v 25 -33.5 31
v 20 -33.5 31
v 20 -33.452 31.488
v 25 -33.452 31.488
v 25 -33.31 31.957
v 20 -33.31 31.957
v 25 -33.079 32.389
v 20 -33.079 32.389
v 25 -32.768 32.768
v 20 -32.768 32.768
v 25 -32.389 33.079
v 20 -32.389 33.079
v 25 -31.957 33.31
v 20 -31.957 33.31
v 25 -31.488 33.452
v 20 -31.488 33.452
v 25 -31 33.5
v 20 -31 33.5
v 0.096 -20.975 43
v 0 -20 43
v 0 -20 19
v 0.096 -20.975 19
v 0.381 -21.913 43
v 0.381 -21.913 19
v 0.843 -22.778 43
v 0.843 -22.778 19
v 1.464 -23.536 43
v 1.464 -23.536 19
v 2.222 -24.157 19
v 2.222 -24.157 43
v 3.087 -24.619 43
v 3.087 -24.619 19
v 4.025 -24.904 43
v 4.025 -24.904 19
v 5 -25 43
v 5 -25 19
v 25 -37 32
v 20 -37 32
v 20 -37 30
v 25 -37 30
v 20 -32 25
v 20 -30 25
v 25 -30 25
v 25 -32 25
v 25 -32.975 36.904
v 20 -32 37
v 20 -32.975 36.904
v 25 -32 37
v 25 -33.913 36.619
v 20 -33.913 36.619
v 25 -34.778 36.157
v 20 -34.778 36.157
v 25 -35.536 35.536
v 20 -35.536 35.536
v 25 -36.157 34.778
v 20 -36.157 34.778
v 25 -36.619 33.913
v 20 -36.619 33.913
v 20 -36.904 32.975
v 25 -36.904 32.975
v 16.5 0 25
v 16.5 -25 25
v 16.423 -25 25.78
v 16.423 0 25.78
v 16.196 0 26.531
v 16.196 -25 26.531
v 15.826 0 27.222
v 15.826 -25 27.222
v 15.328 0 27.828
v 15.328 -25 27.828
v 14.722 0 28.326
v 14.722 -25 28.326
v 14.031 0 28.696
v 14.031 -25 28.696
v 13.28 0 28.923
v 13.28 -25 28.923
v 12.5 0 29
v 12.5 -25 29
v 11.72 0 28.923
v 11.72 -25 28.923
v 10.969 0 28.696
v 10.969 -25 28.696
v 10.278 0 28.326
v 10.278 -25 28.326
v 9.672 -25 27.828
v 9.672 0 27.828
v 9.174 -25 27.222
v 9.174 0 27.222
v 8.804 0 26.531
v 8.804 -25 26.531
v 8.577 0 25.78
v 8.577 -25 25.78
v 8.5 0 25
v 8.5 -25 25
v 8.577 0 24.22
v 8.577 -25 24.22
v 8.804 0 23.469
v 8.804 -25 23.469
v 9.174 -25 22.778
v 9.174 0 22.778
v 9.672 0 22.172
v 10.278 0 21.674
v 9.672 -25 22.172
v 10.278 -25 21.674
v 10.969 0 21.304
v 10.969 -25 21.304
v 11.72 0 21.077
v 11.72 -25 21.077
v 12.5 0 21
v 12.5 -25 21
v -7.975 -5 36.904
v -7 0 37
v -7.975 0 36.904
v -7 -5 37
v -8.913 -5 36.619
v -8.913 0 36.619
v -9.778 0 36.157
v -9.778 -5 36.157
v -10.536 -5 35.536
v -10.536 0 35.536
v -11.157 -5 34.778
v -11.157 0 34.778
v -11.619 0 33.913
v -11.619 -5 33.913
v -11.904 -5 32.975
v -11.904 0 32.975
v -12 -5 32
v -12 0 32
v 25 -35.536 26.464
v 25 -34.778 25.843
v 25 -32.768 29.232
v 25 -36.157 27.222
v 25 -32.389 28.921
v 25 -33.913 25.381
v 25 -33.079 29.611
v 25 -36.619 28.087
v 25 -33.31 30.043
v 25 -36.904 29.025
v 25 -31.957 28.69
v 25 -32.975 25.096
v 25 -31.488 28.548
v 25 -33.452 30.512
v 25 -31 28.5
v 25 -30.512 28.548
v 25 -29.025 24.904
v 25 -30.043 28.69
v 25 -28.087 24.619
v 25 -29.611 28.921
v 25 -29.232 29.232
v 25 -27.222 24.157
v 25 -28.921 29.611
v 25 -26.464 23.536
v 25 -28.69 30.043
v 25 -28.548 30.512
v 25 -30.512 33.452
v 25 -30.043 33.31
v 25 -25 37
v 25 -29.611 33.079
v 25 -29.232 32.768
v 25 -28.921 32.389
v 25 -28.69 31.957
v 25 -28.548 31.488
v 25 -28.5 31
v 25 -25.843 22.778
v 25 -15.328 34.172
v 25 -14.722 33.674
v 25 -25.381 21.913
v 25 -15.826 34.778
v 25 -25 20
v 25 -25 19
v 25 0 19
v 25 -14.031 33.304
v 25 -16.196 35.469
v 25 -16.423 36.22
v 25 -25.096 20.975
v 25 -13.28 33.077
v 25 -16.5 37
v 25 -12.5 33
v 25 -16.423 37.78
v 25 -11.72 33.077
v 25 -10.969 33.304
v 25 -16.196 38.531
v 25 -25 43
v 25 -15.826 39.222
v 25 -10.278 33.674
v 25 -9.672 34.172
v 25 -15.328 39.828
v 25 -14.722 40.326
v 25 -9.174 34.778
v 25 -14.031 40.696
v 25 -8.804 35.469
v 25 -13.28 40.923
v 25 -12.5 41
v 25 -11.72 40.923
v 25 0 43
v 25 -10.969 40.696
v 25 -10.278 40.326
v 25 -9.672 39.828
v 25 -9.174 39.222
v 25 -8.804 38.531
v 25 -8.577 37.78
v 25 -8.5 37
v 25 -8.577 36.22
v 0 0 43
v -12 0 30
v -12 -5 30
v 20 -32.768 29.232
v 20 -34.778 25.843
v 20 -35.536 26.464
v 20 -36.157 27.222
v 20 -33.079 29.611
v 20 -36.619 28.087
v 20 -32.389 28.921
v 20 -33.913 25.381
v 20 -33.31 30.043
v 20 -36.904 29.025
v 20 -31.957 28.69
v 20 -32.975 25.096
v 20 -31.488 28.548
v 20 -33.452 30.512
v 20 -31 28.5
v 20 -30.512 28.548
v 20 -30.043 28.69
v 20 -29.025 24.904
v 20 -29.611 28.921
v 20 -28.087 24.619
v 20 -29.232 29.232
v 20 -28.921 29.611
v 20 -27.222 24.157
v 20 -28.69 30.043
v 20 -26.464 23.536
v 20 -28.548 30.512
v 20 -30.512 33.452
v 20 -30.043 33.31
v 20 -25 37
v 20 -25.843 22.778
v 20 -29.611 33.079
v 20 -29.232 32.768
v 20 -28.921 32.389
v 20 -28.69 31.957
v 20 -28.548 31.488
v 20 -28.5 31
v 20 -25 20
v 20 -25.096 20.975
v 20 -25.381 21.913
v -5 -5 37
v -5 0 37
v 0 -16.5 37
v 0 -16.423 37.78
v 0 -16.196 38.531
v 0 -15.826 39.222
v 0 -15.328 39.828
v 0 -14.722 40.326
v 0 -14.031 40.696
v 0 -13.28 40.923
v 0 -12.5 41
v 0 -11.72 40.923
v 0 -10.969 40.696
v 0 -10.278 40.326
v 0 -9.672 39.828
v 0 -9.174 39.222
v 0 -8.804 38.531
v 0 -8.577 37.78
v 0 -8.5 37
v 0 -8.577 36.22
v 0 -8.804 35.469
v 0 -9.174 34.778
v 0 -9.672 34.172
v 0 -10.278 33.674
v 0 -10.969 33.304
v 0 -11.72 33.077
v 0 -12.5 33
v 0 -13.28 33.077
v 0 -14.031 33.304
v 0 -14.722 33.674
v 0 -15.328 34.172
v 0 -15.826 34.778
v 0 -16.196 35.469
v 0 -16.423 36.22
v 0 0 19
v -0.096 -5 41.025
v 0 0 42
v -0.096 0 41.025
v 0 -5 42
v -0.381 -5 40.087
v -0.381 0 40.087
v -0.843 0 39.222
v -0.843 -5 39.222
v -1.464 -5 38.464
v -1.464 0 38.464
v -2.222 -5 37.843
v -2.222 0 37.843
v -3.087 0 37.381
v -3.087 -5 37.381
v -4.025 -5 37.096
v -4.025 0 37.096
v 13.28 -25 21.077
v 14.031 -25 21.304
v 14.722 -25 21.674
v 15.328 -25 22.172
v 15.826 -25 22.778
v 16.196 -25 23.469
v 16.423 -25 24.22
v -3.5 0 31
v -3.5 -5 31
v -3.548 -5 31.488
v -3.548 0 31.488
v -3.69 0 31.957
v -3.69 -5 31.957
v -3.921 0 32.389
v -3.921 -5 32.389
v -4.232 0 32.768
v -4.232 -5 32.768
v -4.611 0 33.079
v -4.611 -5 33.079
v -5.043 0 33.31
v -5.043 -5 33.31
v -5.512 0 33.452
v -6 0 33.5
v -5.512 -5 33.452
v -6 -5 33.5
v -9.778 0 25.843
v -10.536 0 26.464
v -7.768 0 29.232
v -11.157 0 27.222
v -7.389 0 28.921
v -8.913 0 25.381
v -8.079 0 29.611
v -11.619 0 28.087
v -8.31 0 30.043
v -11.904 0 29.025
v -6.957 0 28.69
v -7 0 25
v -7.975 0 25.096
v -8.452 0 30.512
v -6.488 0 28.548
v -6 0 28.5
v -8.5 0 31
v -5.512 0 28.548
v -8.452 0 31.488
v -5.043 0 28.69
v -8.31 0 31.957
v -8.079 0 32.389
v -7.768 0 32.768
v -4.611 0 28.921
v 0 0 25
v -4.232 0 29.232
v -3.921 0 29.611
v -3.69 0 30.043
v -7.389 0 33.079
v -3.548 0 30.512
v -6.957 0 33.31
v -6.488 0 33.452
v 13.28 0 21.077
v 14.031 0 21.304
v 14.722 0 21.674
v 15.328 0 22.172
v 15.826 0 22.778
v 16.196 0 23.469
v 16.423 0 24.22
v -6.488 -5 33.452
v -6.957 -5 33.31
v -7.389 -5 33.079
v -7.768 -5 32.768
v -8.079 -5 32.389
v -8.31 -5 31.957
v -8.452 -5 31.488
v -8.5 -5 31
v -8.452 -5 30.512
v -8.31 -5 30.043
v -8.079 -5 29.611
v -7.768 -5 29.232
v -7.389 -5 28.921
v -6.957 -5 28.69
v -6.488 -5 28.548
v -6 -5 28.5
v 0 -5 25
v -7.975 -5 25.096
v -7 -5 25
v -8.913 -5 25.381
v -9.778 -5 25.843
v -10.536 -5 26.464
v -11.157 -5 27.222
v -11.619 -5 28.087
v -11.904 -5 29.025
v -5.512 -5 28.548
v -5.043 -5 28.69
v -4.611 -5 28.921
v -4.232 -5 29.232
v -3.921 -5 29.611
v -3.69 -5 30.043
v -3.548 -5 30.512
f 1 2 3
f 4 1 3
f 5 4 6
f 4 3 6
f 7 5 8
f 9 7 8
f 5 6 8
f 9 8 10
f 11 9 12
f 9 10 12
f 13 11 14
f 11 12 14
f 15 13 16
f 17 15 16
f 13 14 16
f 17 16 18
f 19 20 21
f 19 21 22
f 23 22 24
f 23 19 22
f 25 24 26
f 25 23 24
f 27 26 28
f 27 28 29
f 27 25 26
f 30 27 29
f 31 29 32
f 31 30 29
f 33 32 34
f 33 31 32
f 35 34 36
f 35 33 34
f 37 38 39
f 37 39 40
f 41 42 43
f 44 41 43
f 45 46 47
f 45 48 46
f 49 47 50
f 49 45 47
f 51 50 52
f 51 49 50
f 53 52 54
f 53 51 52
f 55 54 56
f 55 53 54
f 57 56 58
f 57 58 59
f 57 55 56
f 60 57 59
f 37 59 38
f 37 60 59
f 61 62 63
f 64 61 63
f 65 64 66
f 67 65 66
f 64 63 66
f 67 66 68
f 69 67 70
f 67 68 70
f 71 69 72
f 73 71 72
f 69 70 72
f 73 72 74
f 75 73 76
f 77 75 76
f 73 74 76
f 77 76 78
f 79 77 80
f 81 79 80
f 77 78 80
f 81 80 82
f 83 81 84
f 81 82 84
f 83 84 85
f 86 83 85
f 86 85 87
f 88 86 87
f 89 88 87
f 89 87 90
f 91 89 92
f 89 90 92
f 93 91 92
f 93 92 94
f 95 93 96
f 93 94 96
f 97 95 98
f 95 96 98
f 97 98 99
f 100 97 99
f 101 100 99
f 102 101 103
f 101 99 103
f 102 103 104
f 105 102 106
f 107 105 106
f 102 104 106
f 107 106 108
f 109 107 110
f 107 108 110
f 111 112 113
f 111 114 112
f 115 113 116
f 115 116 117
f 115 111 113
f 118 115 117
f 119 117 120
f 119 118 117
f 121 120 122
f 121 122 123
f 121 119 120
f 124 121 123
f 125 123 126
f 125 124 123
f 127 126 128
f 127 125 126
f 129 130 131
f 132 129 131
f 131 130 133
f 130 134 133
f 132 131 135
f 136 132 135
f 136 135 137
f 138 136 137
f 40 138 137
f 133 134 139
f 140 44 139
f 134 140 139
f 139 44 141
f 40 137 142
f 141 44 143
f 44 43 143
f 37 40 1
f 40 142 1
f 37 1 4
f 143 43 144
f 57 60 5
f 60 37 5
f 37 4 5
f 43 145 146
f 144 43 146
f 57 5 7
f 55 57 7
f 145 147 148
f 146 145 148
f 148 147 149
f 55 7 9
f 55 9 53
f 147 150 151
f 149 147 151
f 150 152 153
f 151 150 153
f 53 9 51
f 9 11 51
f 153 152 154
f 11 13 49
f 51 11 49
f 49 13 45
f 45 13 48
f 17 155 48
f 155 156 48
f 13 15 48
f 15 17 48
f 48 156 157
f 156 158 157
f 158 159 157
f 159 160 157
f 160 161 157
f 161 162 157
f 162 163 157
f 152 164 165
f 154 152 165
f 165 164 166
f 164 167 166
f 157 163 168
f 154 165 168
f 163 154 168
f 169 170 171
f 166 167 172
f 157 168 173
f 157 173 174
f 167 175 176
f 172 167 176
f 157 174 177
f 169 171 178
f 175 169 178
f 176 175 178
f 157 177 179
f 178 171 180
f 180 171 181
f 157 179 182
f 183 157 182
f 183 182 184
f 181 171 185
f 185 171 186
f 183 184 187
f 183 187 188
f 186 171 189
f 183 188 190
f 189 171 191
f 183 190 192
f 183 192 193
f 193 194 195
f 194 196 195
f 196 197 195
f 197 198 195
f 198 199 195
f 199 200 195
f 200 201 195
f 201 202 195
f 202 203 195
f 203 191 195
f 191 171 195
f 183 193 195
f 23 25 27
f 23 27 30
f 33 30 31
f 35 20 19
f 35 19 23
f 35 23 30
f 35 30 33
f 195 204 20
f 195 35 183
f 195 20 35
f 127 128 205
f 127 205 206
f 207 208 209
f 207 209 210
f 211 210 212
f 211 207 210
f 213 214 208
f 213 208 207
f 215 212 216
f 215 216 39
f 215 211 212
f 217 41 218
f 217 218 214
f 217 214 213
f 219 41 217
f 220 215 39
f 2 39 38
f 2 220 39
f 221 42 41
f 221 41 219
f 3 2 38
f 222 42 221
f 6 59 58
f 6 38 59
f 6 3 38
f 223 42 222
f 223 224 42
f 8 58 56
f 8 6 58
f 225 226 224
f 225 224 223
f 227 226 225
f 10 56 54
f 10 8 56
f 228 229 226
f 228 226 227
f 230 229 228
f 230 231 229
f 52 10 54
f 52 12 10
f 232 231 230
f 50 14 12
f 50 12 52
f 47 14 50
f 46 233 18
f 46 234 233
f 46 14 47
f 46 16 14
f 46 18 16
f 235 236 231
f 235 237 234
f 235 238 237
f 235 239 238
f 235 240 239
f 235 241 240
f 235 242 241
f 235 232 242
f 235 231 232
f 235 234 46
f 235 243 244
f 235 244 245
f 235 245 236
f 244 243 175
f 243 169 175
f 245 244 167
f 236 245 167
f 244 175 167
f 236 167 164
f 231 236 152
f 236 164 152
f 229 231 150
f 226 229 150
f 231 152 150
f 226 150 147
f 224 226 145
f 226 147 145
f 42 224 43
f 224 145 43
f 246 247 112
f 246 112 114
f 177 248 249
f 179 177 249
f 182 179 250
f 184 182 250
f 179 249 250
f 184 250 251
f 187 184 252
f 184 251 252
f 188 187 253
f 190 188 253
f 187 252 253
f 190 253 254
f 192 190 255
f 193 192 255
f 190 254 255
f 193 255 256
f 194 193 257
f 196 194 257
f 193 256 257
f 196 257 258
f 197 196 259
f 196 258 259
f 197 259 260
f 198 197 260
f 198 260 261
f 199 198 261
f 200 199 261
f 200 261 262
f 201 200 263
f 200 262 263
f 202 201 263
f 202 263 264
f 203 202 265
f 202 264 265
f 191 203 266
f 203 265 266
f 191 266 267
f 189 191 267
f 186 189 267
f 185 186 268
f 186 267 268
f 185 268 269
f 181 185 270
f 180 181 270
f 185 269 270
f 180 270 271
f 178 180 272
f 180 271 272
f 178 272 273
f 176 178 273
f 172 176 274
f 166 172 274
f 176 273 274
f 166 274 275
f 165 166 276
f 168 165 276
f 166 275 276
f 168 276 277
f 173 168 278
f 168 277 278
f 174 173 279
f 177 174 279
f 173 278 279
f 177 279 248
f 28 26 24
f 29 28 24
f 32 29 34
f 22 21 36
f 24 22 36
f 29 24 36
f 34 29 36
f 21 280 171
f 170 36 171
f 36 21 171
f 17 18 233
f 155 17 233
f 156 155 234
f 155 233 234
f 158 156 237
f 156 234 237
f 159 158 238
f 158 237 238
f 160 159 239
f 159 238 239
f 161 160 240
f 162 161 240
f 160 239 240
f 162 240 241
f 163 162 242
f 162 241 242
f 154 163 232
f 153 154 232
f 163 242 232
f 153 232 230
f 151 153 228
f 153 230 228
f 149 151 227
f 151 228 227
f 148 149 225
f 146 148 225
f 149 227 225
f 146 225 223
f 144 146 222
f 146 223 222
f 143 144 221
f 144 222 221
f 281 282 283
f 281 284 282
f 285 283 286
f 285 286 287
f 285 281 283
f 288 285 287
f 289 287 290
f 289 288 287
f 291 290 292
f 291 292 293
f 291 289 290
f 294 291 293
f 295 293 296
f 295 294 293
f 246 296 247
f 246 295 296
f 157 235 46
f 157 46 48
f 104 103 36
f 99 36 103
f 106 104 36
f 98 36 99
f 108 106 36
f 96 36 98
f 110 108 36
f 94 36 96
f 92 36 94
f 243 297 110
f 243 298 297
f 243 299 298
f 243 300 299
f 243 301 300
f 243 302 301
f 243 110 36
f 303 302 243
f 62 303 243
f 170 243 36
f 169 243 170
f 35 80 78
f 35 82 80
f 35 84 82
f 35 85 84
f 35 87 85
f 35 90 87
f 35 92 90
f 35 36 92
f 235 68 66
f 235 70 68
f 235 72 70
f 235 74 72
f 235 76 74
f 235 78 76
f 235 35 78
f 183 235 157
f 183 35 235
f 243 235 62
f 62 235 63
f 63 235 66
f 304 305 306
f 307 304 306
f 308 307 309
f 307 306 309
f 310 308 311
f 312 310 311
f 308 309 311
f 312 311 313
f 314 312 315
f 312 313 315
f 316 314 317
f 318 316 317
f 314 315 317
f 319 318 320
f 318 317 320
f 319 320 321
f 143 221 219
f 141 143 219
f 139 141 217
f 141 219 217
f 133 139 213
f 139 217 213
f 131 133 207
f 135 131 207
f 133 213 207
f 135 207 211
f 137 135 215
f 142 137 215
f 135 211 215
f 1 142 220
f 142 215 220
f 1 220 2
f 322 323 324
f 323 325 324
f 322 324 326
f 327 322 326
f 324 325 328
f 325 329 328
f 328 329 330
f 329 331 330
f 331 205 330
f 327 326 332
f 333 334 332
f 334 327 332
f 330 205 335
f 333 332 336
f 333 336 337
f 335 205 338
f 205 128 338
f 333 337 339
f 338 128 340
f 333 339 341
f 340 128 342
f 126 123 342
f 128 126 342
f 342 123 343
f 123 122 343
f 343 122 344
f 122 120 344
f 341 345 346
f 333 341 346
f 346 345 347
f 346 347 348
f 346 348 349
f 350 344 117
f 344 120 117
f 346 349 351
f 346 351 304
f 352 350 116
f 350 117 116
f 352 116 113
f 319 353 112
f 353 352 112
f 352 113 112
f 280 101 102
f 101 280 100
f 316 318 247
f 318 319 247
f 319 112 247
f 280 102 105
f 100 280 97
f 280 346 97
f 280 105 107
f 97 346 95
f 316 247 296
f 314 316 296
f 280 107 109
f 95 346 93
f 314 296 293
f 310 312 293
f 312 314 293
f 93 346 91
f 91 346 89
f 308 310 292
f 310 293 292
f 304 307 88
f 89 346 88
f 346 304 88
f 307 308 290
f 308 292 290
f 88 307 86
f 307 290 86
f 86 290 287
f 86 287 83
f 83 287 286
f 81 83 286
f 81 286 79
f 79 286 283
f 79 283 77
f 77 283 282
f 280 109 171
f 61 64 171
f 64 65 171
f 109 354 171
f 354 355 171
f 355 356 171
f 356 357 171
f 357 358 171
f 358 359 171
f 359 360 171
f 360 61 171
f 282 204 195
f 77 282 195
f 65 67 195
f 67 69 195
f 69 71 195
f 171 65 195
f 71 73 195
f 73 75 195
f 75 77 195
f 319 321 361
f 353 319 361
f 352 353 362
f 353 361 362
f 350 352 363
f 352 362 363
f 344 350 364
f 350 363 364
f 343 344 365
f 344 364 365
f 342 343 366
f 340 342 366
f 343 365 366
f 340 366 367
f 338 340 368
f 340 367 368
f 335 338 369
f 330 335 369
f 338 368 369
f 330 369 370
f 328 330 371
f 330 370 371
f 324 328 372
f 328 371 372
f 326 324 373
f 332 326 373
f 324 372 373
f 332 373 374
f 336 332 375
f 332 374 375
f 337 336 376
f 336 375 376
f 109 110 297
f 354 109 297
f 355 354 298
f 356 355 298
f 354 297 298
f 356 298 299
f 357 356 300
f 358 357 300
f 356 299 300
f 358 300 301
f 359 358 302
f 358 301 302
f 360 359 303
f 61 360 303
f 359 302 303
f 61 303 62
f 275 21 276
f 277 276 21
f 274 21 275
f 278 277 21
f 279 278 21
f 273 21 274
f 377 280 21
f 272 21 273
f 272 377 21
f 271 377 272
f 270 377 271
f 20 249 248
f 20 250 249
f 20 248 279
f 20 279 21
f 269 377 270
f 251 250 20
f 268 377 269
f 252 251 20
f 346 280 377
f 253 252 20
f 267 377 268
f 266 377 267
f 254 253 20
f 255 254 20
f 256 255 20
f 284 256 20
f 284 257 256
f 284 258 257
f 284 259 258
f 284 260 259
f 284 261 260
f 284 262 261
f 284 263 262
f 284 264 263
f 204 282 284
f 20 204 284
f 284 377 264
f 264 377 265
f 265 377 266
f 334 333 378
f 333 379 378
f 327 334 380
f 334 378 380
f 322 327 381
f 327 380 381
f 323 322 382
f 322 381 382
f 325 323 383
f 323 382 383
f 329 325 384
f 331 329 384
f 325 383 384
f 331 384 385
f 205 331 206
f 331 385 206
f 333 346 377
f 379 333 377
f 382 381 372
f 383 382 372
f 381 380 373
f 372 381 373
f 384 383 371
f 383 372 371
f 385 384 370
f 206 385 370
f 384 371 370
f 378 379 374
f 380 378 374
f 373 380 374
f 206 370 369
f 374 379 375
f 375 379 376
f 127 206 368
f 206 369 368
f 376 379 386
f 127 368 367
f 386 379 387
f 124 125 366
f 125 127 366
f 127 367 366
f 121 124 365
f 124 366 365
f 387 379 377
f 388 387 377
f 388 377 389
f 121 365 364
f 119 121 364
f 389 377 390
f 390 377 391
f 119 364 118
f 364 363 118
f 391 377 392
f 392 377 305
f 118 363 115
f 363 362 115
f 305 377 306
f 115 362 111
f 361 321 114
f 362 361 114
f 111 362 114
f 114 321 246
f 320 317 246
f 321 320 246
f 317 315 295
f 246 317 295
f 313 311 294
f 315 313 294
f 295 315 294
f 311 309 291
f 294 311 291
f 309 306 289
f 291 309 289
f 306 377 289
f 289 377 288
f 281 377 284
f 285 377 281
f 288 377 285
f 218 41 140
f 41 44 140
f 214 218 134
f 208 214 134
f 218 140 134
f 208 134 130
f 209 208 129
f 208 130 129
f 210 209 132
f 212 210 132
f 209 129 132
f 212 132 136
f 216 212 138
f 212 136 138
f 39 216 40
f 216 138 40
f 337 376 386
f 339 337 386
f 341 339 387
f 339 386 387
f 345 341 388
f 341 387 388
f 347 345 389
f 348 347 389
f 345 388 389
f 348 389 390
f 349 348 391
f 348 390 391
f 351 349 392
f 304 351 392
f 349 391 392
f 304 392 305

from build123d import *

# Parameters (mm, degrees)
F0_W      = 25
F0_H      = 45
F1_DEPTH  = 25
F3_DEPTH  = 25
F5_DEPTH  = 25
F6_W      = 5
F6_H      = 12
F7_DEPTH  = 12
F9_DEPTH  = 25
F10_R     = 5
F11_W     = 5
F11_H     = 12
F12_DEPTH = 12
F14_DEPTH = 25
F15_R     = 5
F16_W     = 19
F16_H     = 6
F17_DEPTH = 19
F19_DEPTH = 12
F20_R     = 5
F21_R     = 5
F22_DEPTH = 2
F23_DEPTH = 19
F24_DEPTH = 7


with BuildPart() as f1:
    # F0 (on Front) → F1 (new body)
    with BuildSketch(Plane.XZ):
        with Locations((12.5, 22.5)):
            Rectangle(F0_W, F0_H)
    extrude(amount=F1_DEPTH)

    # F2 (on face) → F3 (cut)
    with BuildSketch(Plane.XZ.offset(25)):
        with BuildLine():
            ThreePointArc((16.5, 25), (9.6715728753, 27.8284271247), (12.5, 21))
            ThreePointArc((12.5, 21), (15.3284271247, 22.1715728753), (16.5, 25))
        make_face()
    extrude(amount=-F3_DEPTH, mode=Mode.SUBTRACT)

    # F4 (on face) → F5 (cut)
    with BuildSketch(Plane(origin=(0, 0, 0), x_dir=(0, -1, 0), z_dir=(-1, 0, 0))):
        with BuildLine():
            ThreePointArc((16.5, 37), (9.6715728753, 39.8284271247), (12.5, 33))
            ThreePointArc((12.5, 33), (15.3284271247, 34.1715728753), (16.5, 37))
        make_face()
    extrude(amount=-F5_DEPTH, mode=Mode.SUBTRACT)

    # F6 (on face) → F7 (join)
    with BuildSketch(Plane(origin=(0, 0, 0), x_dir=(0, -1, 0), z_dir=(-1, 0, 0))):
        with Locations((2.5, 31)):
            Rectangle(F6_W, F6_H)
    extrude(amount=F7_DEPTH)

    # F8 (on face) → F9 (cut)
    with BuildSketch(Plane.XZ.offset(5)):
        with BuildLine():
            ThreePointArc((-6, 33.5), (-8.5, 31), (-6, 28.5))
            Line((-6, 28.5), (-6, 33.5))
        make_face()
        with BuildLine():
            Line((-6, 33.5), (-6, 28.5))
            ThreePointArc((-6, 28.5), (-4.232233047, 29.232233047), (-3.5, 31))
            ThreePointArc((-3.5, 31), (-4.232233047, 32.767766953), (-6, 33.5))
        make_face()
    extrude(amount=-F9_DEPTH, mode=Mode.SUBTRACT)

    # F10
    f10_edges = [f1.edges().sort_by_distance(p)[0] for p in [
        (-12, -2.5, 37),
        (-12, -2.5, 25),
        (0, -2.5, 37),
    ]]
    fillet(f10_edges, radius=F10_R)

    # F11 (on face) → F12 (join)
    with BuildSketch(Plane.XZ.offset(25)):
        with Locations((22.5, 31)):
            Rectangle(F11_W, F11_H)
    extrude(amount=F12_DEPTH)

    # F13 (on face) → F14 (cut)
    with BuildSketch(Plane(origin=(20, 0, 0), x_dir=(0, -1, 0), z_dir=(-1, 0, 0))):
        with BuildLine():
            ThreePointArc((31, 33.5), (28.5, 31), (31, 28.5))
            Line((31, 28.5), (31, 33.5))
        make_face()
        with BuildLine():
            Line((31, 33.5), (31, 28.5))
            ThreePointArc((31, 28.5), (32.767766953, 29.232233047), (33.5, 31))
            ThreePointArc((33.5, 31), (32.767766953, 32.767766953), (31, 33.5))
        make_face()
    extrude(amount=-F14_DEPTH, mode=Mode.SUBTRACT)

    # F15
    f15_edges = [f1.edges().sort_by_distance(p)[0] for p in [
        (22.5, -37, 37),
        (22.5, -37, 25),
        (22.5, -25, 25),
    ]]
    fillet(f15_edges, radius=F15_R)

    # F16 (on face) → F17 (cut)
    with BuildSketch(Plane(origin=(0, 0, 0), x_dir=(0, -1, 0), z_dir=(-1, 0, 0))):
        with Locations((15.5, 7)):
            Rectangle(F16_W, F16_H)
    extrude(amount=-F17_DEPTH, mode=Mode.SUBTRACT)

    # F18 (on face) → F19 (cut)
    with BuildSketch(Plane(origin=(0, 0, 0), x_dir=(1, 0, 0), z_dir=(0, 0, -1))):
        Polygon((7.7781745931, 20.1085767529), (5.9480475741, 19.0519524259), (5.2781745931, 18.6652010799), (5.2781745931, 15.778449734), (7.7781745931, 14.335074061), (10.2781745931, 15.778449734), (10.2781745931, 18.6652010799), align=None)
    extrude(amount=-F19_DEPTH, mode=Mode.SUBTRACT)

    # F20
    f20_edges = [f1.edges().sort_by_distance(p)[0] for p in [
        (19, -6, 7),
    ]]
    fillet(f20_edges, radius=F20_R)

    # F21
    f21_edges = [f1.edges().sort_by_distance(p)[0] for p in [
        (0, -25, 2),
        (0, -25, 27.5),
    ]]
    fillet(f21_edges, radius=F21_R)

    # F22 (cut): a face of the model
    f22_faces = [f1.faces().sort_by_distance(p)[0] for p in [
        (12.59855993, -12.40144007, 45),
    ]]
    extrude(f22_faces, amount=-F22_DEPTH, mode=Mode.SUBTRACT)

    # F23 (cut): a face of the model
    f23_faces = [f1.faces().sort_by_distance(p)[0] for p in [
        (12.7730869211, -12.2269130789, 0),
    ]]
    extrude(f23_faces, amount=-F23_DEPTH, mode=Mode.SUBTRACT)

    # F24 (cut, through all): a face of the model
    f24_faces = [f1.faces().sort_by_distance(p)[0] for p in [
        (7.7781745931, -17.2218254069, 12),
    ]]
    extrude(f24_faces, amount=-F24_DEPTH, mode=Mode.SUBTRACT)


solid = f1.part
